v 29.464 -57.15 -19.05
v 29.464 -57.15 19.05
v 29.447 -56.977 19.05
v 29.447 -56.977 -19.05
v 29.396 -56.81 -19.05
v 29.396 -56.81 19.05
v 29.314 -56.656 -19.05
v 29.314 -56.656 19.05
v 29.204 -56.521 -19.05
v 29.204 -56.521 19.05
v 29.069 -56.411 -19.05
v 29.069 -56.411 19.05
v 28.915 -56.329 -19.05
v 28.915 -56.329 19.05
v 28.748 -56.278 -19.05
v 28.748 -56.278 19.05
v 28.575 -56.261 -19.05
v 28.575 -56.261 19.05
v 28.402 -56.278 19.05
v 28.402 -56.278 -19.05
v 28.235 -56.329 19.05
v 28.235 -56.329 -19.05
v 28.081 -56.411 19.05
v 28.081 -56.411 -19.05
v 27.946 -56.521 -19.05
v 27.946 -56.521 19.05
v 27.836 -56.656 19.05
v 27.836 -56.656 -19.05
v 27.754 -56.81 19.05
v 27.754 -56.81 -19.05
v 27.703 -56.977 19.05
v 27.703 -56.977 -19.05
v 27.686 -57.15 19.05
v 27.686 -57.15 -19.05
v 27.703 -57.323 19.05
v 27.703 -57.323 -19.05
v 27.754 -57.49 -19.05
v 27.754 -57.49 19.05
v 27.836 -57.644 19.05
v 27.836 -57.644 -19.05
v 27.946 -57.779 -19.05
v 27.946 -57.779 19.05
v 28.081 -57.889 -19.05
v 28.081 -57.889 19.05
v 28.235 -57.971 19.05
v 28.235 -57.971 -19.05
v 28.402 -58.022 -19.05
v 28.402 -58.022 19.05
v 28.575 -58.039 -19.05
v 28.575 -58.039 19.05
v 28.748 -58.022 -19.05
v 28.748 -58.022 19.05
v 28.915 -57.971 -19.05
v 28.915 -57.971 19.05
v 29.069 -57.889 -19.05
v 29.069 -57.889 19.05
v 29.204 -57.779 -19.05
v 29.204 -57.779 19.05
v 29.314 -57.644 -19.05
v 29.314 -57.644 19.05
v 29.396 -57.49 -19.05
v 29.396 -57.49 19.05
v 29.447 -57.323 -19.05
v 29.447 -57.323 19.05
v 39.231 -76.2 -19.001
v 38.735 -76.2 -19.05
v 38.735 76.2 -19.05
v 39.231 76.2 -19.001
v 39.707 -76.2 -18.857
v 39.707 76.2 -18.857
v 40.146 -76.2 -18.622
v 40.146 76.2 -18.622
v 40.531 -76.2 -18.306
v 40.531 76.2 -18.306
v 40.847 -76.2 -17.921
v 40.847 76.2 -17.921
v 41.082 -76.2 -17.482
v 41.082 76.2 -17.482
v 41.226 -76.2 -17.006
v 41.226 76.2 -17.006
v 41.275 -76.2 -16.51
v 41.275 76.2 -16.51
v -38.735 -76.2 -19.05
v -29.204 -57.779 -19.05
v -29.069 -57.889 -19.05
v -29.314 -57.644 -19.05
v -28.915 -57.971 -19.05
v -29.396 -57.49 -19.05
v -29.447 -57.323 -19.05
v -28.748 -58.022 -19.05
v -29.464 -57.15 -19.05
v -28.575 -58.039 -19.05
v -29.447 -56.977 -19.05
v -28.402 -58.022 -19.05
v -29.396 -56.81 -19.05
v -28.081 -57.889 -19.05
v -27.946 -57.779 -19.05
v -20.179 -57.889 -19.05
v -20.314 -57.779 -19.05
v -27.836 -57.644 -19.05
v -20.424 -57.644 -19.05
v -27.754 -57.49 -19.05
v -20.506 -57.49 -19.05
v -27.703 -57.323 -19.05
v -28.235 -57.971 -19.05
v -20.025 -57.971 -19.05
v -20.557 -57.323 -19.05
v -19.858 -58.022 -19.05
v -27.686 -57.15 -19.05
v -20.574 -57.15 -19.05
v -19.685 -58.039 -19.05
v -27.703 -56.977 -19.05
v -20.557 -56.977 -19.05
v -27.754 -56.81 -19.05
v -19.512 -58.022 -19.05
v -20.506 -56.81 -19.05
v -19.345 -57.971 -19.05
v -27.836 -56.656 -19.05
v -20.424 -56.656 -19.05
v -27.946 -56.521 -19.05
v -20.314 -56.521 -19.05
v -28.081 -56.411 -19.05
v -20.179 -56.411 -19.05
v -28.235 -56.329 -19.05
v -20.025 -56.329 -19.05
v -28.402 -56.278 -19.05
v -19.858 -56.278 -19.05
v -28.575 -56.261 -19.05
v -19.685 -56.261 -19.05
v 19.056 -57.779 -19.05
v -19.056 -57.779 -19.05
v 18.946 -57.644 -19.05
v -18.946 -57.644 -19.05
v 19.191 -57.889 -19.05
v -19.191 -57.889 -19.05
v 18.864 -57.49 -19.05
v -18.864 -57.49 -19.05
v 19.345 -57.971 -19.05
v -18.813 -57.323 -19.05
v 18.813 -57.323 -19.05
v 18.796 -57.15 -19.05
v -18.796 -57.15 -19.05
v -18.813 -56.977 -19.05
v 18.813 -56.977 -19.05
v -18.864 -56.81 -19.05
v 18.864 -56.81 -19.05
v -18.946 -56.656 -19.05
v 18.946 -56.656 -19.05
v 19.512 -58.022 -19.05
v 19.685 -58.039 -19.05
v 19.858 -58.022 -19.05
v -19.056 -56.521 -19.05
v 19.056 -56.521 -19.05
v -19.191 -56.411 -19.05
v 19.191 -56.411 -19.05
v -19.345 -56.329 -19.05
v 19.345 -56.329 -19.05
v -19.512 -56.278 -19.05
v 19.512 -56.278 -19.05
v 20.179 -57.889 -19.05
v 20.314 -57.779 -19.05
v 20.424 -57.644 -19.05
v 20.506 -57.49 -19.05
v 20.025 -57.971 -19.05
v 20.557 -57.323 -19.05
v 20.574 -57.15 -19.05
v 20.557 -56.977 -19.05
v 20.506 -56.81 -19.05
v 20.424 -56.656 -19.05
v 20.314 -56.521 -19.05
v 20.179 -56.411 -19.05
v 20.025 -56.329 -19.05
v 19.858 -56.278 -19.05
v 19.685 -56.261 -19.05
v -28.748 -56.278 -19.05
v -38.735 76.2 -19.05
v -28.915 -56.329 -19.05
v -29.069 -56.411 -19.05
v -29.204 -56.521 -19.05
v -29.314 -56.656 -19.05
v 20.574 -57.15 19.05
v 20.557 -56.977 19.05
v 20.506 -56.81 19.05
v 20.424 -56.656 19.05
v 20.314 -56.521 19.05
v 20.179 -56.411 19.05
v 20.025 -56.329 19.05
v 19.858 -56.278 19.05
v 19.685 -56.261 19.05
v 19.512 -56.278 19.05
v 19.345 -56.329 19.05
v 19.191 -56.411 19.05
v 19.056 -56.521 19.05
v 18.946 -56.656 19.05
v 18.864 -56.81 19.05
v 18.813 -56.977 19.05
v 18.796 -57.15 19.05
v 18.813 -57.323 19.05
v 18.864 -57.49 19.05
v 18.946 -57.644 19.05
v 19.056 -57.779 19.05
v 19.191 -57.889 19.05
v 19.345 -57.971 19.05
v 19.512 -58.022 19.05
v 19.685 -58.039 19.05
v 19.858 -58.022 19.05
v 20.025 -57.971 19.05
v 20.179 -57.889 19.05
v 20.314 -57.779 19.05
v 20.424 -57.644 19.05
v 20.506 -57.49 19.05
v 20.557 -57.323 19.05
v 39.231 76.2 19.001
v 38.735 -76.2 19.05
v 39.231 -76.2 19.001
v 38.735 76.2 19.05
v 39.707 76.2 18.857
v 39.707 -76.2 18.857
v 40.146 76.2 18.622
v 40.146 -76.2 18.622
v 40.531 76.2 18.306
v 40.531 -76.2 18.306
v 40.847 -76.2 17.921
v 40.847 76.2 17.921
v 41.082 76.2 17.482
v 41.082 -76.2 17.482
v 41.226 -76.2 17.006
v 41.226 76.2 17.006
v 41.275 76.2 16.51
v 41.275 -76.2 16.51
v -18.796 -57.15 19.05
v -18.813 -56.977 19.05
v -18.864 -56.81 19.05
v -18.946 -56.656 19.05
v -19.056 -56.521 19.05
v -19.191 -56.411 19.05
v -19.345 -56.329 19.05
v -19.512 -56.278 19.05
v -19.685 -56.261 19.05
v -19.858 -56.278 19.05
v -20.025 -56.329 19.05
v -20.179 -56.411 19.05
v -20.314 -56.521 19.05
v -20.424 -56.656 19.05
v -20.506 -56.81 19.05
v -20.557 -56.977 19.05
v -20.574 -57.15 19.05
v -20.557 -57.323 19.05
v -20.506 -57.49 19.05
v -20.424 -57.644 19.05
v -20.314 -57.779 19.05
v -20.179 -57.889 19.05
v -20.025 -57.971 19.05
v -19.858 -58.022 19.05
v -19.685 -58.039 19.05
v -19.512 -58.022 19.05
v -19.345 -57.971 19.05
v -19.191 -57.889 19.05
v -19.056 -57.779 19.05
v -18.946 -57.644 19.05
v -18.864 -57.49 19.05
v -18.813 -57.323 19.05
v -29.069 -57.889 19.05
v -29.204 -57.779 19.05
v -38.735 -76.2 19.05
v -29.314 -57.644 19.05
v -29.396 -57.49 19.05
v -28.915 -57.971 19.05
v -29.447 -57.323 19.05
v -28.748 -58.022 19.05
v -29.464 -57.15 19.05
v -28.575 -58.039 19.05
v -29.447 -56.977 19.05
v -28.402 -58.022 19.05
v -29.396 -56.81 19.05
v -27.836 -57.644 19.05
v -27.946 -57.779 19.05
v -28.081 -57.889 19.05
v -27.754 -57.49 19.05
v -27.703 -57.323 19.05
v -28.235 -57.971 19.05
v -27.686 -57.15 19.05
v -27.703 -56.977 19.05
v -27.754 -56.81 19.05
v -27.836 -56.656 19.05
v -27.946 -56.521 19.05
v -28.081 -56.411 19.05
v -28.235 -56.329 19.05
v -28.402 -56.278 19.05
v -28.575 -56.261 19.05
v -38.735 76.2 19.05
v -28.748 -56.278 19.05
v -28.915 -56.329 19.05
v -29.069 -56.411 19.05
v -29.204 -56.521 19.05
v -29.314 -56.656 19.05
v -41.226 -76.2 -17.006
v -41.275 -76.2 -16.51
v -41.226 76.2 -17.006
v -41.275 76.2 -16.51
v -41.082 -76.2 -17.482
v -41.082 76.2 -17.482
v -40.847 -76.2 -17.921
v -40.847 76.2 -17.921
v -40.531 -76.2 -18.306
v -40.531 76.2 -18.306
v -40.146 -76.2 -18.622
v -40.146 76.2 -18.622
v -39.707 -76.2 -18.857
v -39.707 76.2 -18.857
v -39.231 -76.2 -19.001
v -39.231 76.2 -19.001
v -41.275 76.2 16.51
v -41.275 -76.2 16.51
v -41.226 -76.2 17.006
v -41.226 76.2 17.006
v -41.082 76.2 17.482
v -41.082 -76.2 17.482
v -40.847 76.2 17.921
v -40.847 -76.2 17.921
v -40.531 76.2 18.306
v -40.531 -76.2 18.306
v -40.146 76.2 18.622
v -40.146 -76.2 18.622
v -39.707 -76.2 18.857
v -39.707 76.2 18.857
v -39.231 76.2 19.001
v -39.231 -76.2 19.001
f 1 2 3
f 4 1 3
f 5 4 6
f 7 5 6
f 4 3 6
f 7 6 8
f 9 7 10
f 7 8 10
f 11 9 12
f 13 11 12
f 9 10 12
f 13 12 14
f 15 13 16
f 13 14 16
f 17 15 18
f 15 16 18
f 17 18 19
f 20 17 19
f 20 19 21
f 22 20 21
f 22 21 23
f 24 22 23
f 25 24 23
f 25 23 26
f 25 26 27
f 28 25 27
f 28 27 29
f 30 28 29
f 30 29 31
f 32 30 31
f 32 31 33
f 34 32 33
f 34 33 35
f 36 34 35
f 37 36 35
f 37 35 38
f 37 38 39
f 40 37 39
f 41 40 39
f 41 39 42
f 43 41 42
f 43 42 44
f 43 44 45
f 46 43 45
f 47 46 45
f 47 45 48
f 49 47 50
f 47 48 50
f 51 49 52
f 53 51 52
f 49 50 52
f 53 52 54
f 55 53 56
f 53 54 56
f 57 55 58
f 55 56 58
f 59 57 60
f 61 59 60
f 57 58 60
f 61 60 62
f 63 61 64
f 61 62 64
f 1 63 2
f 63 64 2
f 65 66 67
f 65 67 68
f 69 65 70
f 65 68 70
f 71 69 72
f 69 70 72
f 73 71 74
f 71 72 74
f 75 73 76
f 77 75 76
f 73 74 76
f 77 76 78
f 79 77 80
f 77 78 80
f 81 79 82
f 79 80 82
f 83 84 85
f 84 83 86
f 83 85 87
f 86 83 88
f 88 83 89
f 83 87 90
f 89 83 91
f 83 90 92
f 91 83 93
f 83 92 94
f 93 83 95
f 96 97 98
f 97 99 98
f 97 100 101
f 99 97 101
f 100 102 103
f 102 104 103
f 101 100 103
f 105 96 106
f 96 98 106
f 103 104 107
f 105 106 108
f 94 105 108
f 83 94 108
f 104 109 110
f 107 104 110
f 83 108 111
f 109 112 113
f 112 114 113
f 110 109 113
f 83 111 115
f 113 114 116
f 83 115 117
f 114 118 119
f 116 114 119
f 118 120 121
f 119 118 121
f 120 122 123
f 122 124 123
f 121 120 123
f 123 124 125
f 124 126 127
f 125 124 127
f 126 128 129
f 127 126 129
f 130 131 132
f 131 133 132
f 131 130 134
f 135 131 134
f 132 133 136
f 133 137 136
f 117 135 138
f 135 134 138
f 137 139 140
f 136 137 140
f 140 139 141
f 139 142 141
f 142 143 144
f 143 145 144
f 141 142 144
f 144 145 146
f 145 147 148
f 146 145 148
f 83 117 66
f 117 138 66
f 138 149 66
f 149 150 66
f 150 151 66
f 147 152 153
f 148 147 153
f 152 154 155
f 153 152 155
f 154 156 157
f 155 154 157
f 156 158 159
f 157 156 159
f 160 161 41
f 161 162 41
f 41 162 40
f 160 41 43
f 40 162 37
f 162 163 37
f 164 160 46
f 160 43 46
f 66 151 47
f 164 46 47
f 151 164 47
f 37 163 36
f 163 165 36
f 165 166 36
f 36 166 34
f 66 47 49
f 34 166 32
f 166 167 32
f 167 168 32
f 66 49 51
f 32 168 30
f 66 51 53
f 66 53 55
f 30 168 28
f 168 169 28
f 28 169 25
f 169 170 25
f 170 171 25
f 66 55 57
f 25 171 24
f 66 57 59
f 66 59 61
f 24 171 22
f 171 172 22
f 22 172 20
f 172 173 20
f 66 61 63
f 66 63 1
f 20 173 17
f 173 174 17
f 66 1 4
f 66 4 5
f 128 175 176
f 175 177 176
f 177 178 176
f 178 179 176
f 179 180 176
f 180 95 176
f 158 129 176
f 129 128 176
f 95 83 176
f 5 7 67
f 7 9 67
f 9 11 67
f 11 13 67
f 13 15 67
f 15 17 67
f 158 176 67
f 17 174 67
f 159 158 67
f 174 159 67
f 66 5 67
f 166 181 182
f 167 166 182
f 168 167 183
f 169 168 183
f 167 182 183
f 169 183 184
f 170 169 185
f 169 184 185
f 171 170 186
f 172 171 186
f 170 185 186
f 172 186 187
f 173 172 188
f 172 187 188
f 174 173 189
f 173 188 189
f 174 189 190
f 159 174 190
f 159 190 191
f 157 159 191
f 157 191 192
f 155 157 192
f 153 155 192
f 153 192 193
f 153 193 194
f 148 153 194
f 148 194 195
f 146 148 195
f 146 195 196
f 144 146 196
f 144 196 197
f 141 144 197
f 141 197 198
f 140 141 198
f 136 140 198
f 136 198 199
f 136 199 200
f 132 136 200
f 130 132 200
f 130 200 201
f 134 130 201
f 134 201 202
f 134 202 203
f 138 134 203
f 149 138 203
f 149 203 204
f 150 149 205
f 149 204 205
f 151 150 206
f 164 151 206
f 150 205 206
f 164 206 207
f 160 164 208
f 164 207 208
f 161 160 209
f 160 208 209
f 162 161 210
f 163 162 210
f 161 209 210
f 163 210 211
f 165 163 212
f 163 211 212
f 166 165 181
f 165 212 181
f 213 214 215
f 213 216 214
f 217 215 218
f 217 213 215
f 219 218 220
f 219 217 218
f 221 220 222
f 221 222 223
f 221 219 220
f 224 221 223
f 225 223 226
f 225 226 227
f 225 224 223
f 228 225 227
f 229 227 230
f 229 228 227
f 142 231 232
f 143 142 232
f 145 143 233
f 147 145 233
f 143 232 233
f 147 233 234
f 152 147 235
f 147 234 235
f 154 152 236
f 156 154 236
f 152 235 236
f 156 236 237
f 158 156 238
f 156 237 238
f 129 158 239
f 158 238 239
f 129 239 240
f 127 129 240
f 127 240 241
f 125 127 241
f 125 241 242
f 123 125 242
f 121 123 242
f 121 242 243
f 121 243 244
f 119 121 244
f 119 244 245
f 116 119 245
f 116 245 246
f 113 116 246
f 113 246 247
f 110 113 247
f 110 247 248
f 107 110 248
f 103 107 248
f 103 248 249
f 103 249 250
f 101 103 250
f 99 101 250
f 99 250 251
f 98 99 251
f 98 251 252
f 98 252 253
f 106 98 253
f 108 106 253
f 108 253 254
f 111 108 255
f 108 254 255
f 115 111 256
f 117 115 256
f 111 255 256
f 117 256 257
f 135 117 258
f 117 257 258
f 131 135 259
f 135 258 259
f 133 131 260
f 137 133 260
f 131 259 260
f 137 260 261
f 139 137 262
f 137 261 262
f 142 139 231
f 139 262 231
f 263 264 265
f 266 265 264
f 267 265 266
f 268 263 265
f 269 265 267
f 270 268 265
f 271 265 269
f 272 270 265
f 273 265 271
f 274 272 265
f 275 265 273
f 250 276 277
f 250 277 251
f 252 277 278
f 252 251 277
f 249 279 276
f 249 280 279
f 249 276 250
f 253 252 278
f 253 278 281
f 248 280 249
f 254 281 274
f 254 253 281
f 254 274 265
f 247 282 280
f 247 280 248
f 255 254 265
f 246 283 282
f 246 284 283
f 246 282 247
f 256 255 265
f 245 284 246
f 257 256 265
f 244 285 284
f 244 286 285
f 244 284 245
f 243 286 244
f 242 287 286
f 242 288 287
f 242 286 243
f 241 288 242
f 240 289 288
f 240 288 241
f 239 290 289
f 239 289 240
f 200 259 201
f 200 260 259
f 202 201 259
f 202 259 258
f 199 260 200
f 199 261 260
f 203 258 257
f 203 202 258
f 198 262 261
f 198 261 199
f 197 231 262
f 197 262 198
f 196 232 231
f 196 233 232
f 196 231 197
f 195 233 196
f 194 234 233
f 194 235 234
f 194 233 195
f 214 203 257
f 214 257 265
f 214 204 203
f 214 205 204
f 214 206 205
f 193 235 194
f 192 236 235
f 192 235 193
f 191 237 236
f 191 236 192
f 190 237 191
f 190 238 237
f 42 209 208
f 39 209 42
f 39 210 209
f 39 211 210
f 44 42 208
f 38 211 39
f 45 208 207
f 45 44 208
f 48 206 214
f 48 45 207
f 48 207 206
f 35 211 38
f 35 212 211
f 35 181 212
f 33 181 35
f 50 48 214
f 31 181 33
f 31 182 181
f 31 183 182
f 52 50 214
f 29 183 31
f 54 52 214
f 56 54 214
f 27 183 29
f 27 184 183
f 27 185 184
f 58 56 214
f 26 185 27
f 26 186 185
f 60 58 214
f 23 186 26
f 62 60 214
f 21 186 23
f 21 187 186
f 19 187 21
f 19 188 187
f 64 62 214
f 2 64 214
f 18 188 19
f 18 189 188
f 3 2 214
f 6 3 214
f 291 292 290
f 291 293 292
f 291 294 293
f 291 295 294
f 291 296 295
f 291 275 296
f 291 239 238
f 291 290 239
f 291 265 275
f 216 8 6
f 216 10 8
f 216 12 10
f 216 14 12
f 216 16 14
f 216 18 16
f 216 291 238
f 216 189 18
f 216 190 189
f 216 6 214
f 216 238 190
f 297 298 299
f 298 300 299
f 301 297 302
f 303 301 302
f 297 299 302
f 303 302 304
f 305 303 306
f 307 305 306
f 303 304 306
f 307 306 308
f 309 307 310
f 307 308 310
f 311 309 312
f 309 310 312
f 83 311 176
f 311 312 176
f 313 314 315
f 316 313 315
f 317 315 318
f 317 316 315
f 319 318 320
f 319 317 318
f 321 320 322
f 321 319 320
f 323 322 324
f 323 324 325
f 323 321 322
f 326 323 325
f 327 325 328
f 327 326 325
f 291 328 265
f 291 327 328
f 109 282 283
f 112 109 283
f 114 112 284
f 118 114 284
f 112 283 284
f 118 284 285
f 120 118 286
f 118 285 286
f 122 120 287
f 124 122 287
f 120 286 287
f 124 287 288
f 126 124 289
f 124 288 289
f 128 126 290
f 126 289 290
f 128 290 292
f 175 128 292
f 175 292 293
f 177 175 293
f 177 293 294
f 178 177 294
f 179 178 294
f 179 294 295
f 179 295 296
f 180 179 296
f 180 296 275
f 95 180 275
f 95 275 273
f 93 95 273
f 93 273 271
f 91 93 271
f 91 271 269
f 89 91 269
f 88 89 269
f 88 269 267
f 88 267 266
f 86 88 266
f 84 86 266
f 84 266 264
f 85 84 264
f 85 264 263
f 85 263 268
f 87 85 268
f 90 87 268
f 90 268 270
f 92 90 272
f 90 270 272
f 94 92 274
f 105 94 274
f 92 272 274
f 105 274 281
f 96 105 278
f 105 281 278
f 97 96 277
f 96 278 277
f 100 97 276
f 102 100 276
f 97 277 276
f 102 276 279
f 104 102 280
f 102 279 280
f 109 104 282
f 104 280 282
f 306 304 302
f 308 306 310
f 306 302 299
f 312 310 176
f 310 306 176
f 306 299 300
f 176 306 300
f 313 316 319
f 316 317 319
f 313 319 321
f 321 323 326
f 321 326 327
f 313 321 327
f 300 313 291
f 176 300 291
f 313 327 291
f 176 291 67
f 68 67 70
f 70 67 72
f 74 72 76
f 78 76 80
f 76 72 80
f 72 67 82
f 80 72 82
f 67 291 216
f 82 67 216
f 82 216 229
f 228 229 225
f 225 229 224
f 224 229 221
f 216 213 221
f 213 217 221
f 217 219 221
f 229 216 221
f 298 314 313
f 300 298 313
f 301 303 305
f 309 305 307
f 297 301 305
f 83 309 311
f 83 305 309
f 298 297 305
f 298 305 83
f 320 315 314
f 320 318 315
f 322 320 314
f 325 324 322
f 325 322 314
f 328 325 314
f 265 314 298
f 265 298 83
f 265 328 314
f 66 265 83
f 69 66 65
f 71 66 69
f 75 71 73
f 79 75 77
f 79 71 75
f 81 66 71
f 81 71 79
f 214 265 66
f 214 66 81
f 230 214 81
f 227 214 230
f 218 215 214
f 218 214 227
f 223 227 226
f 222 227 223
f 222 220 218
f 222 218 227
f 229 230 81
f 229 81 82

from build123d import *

# Parameters (mm, degrees)
SKETCH1_W           = 82.55
SKETCH1_H           = 152.4
BOSS_EXTRUDE1_DEPTH = 19.05
SKETCH2_R           = 0.889
CUT_EXTRUDE1_DEPTH  = 95.666127126
FILLET1_R           = 2.54


with BuildPart() as part:
    # Sketch1 → Boss-Extrude1 (new, symmetric)
    with BuildSketch(Plane.XY):
        Rectangle(SKETCH1_W, SKETCH1_H)
    extrude(amount=BOSS_EXTRUDE1_DEPTH, both=True)

    # Sketch2 → Cut-Extrude1 (cut, through all)
    with BuildSketch(Plane.XY.offset(19.05)):
        with Locations((-28.575, -57.15)):
            Circle(SKETCH2_R)
        with Locations((-19.685, -57.15)):
            Circle(SKETCH2_R)
        with Locations((28.575, -57.15)):
            Circle(SKETCH2_R)
        with Locations((19.685, -57.15)):
            Circle(SKETCH2_R)
    extrude(amount=-CUT_EXTRUDE1_DEPTH, mode=Mode.SUBTRACT)

    # Fillet1
    fillet1_edges = [part.edges().sort_by_distance(p)[0] for p in [
        (-41.275, 0, 19.05),
        (41.275, 0, 19.05),
        (-41.275, 0, -19.05),
        (41.275, 0, -19.05),
    ]]
    fillet(fillet1_edges, radius=FILLET1_R)


solid = part.part
